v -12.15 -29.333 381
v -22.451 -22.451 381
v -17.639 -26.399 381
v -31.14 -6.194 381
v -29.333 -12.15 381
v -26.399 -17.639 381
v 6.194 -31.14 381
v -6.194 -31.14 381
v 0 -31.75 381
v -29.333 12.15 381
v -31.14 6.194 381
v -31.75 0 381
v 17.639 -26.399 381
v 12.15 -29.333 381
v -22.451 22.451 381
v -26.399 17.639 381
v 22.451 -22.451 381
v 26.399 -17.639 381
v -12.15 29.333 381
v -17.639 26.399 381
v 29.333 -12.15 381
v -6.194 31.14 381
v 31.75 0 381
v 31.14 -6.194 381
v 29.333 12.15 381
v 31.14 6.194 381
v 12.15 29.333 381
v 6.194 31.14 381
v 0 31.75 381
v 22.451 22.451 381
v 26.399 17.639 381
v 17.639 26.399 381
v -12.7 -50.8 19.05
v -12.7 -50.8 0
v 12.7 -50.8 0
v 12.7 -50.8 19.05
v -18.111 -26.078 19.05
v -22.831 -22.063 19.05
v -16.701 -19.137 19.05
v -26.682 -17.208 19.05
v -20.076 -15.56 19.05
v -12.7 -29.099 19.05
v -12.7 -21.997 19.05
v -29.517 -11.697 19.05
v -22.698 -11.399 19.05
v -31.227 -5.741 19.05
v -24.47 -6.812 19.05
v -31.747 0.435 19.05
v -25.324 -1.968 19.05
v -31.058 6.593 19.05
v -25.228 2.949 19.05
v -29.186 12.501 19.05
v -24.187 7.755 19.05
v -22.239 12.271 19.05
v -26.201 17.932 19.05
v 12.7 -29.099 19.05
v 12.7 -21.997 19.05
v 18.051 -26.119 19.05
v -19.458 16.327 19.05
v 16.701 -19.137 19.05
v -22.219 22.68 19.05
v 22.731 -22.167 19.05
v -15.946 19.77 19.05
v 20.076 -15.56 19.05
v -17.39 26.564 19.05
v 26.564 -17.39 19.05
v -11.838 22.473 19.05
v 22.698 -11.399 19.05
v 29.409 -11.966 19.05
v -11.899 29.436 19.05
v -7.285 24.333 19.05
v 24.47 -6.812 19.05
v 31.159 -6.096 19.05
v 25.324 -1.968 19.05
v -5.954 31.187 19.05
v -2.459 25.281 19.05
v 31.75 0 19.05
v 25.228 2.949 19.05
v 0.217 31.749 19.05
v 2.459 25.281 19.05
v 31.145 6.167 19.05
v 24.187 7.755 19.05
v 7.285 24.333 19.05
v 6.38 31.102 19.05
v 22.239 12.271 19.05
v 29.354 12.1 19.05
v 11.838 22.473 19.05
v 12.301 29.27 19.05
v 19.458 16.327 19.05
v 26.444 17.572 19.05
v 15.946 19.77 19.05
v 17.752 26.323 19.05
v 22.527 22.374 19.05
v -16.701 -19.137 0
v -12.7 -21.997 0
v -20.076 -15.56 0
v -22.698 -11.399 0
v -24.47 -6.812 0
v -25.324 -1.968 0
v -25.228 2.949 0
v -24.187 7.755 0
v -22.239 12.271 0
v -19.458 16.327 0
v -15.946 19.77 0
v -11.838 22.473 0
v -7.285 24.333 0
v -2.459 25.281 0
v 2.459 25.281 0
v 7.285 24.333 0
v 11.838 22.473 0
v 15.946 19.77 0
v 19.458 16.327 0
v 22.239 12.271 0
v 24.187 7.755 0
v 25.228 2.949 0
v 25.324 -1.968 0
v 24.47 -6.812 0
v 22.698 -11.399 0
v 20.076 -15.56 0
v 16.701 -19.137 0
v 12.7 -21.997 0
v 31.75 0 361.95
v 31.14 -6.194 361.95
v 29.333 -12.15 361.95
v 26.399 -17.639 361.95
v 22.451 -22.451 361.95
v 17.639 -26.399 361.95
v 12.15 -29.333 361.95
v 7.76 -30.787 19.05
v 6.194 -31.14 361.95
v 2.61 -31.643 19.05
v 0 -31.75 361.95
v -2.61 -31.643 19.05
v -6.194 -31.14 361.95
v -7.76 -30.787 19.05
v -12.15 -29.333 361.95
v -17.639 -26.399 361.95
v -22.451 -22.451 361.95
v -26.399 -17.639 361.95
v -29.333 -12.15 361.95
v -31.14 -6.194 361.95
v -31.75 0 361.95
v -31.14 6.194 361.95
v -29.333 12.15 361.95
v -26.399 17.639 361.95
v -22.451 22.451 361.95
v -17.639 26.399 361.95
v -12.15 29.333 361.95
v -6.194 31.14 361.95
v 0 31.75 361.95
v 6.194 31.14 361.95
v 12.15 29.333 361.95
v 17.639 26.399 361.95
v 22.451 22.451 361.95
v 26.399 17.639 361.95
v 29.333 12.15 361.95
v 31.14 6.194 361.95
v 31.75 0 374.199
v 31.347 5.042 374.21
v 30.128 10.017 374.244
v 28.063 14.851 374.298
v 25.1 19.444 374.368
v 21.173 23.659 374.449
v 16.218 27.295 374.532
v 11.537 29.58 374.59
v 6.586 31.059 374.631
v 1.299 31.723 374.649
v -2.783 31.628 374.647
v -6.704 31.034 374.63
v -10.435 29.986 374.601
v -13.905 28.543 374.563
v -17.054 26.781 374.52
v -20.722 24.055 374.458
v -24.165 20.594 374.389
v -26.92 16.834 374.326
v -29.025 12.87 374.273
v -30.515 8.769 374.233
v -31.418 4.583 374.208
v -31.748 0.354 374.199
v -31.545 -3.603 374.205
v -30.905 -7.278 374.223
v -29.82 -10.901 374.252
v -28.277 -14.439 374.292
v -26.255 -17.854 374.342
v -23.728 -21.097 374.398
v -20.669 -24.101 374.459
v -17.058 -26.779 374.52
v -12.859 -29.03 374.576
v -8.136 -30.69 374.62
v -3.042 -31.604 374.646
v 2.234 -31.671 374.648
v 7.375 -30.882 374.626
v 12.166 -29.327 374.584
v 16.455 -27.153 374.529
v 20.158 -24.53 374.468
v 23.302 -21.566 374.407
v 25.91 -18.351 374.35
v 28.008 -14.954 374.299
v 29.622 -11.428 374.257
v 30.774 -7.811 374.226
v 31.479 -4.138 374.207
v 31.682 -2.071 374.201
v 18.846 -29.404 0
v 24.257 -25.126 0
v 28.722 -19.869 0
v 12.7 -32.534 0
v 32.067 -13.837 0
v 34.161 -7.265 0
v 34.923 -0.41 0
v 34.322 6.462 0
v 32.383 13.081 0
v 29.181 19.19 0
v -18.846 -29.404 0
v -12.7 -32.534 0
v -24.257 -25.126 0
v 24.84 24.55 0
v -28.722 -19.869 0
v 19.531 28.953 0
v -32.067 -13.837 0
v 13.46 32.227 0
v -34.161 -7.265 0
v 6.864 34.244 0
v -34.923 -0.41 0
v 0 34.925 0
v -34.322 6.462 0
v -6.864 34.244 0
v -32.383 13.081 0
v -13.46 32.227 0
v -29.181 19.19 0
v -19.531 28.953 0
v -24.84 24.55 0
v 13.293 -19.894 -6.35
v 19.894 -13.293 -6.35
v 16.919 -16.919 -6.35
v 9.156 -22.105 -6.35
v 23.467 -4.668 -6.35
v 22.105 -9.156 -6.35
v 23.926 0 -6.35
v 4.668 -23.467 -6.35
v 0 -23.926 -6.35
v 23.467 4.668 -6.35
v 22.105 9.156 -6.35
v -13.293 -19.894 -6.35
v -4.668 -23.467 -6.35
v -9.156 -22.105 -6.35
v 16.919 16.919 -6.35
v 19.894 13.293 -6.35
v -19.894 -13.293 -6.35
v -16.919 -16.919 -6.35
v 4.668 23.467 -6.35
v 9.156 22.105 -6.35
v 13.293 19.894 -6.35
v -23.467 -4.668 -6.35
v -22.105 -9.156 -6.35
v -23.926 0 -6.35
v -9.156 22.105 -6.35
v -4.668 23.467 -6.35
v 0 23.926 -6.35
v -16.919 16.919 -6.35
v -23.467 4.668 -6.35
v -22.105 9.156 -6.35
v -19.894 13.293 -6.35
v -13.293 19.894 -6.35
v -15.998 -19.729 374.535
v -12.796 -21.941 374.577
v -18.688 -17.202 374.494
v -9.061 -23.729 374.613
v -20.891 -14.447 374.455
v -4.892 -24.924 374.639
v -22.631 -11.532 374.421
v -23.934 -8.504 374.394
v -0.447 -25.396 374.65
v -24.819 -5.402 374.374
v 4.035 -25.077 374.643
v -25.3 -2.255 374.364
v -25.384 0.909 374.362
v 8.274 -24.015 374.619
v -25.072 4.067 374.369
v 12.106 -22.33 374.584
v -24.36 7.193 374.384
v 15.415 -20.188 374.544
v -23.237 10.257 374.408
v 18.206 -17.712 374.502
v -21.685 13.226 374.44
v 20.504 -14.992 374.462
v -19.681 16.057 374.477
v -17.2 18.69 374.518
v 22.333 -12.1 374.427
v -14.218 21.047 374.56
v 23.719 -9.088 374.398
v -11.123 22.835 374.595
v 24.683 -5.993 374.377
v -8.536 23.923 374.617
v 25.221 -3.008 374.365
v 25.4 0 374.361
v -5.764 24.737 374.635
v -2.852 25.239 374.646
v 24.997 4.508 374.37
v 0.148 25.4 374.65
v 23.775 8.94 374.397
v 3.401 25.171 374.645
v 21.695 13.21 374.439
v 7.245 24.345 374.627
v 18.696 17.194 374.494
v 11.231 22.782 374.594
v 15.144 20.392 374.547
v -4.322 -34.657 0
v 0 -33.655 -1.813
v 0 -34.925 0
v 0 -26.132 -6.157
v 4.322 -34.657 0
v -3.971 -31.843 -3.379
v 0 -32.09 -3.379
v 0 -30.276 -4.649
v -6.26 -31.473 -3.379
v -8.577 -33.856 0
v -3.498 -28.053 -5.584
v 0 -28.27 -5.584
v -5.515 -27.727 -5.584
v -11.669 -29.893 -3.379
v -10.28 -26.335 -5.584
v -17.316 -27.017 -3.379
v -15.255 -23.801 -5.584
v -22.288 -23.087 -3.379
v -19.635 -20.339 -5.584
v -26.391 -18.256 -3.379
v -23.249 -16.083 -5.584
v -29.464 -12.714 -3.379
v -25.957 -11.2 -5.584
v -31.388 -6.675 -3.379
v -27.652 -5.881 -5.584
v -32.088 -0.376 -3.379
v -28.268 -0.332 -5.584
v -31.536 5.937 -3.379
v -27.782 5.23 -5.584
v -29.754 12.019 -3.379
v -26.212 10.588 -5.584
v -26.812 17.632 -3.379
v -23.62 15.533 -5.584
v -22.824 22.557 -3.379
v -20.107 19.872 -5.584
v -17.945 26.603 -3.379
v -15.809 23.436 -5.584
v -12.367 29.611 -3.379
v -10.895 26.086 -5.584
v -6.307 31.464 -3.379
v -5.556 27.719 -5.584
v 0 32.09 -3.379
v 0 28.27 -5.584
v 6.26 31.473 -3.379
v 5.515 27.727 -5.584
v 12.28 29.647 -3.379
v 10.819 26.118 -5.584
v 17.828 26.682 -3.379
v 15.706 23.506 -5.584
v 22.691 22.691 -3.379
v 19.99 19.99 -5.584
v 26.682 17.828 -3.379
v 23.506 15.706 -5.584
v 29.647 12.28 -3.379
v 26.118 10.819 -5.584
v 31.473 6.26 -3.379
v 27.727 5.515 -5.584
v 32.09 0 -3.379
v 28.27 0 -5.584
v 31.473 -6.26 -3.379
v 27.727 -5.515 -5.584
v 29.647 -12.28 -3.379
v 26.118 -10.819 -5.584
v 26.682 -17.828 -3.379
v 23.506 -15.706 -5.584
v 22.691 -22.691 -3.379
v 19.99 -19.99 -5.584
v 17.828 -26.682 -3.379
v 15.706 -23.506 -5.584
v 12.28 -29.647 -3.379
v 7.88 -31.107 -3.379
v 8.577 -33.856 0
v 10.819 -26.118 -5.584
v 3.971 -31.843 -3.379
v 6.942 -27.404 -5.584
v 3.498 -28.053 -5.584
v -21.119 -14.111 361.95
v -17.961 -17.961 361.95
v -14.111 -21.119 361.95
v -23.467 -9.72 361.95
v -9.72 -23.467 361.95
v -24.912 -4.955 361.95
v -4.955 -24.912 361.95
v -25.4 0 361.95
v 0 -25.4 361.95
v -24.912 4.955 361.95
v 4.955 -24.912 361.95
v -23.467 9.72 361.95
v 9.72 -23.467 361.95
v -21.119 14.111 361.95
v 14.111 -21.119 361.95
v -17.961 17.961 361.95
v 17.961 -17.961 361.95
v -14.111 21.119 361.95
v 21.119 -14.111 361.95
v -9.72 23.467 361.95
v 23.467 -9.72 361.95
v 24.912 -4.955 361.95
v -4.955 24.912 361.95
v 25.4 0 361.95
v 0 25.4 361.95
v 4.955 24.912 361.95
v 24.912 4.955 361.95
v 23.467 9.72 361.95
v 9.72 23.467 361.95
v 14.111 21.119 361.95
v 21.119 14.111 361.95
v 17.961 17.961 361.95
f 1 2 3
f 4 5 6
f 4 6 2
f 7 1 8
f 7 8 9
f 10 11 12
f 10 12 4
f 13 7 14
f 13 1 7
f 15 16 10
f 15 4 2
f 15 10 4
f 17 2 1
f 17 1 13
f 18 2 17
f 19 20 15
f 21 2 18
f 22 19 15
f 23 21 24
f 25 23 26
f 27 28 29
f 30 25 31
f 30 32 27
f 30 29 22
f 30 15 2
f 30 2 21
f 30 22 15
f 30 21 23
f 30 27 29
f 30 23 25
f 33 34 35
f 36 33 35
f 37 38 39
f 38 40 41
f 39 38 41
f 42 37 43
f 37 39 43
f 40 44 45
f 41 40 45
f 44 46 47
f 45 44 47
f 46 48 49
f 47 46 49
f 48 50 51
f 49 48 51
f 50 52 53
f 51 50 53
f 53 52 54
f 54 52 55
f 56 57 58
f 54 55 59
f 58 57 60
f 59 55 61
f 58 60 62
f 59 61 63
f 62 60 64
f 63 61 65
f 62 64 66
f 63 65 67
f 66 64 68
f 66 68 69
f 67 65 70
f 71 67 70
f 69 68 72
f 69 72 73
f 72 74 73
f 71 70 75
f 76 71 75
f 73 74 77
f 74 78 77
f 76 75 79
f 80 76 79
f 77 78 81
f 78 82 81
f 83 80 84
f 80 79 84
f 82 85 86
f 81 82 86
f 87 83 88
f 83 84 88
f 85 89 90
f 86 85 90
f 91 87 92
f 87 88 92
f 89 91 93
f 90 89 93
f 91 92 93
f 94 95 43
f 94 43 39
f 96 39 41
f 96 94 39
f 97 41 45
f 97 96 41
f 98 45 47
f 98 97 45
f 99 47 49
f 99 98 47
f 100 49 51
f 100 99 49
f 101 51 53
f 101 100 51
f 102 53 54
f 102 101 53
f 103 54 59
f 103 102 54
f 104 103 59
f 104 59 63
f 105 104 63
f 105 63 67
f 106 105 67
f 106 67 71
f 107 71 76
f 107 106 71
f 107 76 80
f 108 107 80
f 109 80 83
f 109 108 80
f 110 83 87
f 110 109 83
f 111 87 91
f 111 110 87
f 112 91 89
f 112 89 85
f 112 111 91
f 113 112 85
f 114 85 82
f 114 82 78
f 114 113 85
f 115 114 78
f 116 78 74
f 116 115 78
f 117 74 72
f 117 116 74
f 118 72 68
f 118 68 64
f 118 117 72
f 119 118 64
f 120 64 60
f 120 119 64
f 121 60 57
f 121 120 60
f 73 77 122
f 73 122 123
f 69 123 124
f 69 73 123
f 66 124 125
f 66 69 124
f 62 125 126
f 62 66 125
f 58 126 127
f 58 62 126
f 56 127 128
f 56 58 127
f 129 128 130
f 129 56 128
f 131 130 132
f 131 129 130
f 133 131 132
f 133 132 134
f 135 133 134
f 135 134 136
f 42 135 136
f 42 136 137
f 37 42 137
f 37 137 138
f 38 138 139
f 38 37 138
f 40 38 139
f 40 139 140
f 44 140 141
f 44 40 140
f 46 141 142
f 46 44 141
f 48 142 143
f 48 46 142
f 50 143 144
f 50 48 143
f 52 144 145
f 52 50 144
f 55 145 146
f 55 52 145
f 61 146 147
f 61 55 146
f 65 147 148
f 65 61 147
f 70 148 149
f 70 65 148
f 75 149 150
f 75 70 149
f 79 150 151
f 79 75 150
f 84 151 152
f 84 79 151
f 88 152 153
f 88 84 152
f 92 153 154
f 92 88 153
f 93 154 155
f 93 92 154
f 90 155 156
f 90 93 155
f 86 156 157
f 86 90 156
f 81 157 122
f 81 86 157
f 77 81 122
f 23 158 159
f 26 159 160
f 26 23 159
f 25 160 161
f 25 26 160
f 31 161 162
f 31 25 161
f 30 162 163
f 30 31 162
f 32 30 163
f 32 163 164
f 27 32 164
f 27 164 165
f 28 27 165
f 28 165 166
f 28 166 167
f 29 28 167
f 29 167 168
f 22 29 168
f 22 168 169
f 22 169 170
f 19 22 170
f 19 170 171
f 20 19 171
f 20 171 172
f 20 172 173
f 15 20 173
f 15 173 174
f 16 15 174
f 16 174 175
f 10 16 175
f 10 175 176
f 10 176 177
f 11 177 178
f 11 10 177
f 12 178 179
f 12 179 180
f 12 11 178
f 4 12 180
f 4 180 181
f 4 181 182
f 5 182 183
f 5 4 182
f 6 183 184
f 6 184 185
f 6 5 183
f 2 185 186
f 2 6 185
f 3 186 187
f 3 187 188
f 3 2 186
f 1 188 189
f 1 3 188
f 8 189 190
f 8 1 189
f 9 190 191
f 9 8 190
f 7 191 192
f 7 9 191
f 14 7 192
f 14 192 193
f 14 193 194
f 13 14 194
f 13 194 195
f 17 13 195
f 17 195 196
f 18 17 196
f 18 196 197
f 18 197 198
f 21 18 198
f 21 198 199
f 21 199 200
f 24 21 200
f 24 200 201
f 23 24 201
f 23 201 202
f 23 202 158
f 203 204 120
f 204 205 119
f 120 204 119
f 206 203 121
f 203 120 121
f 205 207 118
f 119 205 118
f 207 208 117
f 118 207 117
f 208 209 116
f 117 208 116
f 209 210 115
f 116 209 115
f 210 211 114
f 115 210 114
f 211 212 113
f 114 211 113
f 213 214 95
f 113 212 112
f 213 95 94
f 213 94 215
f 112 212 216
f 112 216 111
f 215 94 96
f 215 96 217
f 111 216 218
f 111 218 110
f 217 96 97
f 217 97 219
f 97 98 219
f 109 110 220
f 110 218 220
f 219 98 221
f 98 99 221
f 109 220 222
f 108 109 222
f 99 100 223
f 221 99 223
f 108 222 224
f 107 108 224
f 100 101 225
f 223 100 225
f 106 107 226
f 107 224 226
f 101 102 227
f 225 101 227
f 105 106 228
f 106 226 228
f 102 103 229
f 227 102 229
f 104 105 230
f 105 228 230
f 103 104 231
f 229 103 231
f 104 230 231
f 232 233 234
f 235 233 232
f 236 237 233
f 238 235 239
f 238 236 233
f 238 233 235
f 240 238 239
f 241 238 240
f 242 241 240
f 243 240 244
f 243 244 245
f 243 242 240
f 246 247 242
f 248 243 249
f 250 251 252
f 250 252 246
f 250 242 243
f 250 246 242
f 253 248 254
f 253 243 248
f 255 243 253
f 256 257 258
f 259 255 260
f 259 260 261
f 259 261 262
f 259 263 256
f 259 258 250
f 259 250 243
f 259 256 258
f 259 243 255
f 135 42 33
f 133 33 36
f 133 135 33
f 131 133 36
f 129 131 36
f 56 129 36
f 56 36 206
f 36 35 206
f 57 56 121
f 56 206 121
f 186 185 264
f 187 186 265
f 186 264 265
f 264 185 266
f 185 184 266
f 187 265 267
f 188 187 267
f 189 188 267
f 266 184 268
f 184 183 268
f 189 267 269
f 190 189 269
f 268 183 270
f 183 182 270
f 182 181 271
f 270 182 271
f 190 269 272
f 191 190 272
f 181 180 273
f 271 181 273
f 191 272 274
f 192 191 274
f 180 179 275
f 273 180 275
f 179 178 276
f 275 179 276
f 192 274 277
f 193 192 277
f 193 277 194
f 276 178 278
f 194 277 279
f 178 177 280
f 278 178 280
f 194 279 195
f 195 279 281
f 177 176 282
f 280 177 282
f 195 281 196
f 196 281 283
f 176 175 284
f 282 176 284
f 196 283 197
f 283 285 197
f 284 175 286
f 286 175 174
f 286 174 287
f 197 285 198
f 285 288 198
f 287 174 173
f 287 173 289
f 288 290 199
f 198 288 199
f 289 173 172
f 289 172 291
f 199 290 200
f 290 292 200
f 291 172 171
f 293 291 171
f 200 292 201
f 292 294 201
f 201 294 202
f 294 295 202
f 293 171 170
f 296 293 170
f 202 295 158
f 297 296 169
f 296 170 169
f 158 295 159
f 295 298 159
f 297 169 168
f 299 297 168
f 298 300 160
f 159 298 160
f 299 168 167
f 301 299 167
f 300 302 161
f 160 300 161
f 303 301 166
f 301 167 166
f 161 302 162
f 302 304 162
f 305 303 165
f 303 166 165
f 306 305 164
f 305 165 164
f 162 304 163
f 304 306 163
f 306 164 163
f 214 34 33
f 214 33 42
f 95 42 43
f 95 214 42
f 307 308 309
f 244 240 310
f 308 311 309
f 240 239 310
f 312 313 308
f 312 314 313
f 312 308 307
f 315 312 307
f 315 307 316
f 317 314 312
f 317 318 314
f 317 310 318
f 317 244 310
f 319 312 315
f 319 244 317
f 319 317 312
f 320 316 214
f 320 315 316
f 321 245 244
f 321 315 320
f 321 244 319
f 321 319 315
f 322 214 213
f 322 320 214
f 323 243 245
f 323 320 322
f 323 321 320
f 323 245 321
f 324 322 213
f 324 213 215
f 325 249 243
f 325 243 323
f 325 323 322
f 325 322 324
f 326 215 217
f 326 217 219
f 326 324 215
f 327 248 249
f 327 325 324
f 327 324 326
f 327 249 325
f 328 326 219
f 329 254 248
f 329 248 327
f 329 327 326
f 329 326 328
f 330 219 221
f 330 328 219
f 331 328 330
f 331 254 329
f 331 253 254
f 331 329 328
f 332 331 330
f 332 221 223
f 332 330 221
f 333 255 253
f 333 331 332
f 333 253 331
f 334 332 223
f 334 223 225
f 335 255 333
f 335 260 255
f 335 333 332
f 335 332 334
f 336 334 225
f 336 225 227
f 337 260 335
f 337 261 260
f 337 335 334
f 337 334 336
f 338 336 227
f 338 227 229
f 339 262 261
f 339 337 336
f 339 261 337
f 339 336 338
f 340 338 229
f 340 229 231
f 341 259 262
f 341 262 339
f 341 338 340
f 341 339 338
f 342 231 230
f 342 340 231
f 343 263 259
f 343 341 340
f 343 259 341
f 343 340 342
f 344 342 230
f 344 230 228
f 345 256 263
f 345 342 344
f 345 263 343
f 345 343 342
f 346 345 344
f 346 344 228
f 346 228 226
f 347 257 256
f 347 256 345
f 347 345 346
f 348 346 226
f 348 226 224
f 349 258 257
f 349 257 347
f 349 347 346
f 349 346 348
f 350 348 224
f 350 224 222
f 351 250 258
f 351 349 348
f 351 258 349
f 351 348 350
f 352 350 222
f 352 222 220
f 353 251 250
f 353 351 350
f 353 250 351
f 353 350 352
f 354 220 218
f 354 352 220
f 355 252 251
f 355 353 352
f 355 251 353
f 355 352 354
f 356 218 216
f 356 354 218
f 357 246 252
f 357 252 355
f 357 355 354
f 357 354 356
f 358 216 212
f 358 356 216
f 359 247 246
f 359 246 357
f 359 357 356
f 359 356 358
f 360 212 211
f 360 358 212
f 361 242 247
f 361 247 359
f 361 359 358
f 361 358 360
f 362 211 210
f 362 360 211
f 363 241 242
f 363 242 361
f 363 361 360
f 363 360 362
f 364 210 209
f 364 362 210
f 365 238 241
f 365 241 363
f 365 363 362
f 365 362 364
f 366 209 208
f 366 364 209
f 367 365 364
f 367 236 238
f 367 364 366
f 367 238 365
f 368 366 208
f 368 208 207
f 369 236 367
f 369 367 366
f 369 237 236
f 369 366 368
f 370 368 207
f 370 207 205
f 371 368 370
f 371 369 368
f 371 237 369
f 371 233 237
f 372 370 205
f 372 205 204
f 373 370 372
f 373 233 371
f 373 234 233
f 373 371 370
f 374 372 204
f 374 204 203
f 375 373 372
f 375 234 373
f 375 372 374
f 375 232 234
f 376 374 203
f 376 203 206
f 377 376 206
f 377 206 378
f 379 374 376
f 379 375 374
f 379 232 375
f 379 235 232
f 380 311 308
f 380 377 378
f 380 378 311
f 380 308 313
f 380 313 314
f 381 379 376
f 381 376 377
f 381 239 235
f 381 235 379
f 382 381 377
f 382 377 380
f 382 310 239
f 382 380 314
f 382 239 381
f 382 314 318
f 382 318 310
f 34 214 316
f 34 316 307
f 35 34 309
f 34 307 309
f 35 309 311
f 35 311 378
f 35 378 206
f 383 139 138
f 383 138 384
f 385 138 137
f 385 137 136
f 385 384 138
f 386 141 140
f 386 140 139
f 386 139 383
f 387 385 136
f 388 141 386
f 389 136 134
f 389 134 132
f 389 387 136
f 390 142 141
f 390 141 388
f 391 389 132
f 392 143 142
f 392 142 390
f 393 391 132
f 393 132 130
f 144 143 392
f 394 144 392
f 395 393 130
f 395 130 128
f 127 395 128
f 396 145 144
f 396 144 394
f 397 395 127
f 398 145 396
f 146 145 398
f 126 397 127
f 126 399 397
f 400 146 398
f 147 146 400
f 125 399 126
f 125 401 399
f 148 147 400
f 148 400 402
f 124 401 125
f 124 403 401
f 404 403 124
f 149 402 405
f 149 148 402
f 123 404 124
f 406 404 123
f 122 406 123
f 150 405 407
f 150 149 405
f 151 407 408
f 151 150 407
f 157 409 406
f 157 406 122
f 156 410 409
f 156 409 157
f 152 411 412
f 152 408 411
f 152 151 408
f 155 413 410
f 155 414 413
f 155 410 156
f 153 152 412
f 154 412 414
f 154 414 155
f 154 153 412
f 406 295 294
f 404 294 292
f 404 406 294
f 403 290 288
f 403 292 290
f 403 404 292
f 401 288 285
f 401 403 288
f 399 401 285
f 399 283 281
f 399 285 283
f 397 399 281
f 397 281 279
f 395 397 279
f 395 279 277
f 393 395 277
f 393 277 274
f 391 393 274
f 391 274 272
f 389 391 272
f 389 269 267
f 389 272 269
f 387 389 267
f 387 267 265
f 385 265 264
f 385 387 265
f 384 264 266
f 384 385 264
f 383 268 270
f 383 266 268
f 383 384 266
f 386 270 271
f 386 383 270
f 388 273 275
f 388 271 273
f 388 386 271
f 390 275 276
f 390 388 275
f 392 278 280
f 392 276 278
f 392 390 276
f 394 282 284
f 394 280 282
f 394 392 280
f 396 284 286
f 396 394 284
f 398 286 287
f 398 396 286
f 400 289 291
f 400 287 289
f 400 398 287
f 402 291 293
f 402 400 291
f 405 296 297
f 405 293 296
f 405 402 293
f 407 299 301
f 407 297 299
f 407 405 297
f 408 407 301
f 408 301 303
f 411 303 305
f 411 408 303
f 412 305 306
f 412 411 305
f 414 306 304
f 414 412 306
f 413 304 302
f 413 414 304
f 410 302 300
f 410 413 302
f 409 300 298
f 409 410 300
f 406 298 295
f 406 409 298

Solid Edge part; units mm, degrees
sketch "Sketch1" plane through (0, 0, 0) normal (0, 0, 1) x (1, 0, 0)
  line L0 (12.7, -50.8) -> (12.7, -21.997)
  line L1 (0, -50.8) -> (12.7, -50.8)
  line L2 (0, -50.8) -> (-12.7, -50.8)
  line L3 (-12.7, -50.8) -> (-12.7, -21.997)
  arc A0 (-12.7, -21.997) -> (12.7, -21.997) centre (0, 0) cw
extrude "Protrusion1" add sketch "Sketch1" along normal blind 19.05
sketch "Sketch2" plane through (0, -12.7, 0) normal (0, 0, -1) x (0, -1, 0)
  circle A0 centre (-12.7, 0) radius 34.925
extrude "ExtrudedProtrusion_2" add sketch "Sketch2" along normal blind 6.35
fillet "Round_1" radius 12.7 1 edges at (0, 34.925, -6.35)
sketch "Sketch3" plane through (0, -12.7, 19.05) normal (0, 0, 1) x (1, 0, 0)
  circle A0 centre (0, 12.7) radius 31.75
extrude "ExtrudedProtrusion_3" add sketch "Sketch3" along normal blind 342.9
sketch "Sketch4" plane through (0, 0, 361.95) normal (0, 0, 1) x (1, 0, 0)
  circle A0 centre (0, 0) radius 25.4
extrude "ExtrudedProtrusion_4" add sketch "Sketch4" along normal blind 19.05
sketch "Sketch5" plane through (0, 0, 374.65) normal (0, 0, 1) x (1, 0, 0)
  circle A0 centre (0, 0) radius 31.75
extrude "ExtrudedProtrusion_5" add sketch "Sketch5" along normal blind 6.35 and the other way blind 1.27
sketch "Sketch6" plane through (0, 0, 374.65) normal (0, -1, 0) x (-1, 0, 0)
  line L0 (-63.5, 1.8054) -> (63.5, 1.8054)
  arc A0 (-63.5, 1.8054) -> (63.5, 1.8054) centre (0, 1117.6) ccw
extrude "Cutout1" cut sketch "Sketch6" along normal through all and the other way through all
sketch "Sketch7" plane through (0, 0, 361.95) normal (0, 0, 1) x (1, 0, 0)
  circle A0 centre (0, 0) radius 25.4
extrude "Protrusion2" add sketch "Sketch7" along normal up to vertex (19.05 mm away)
